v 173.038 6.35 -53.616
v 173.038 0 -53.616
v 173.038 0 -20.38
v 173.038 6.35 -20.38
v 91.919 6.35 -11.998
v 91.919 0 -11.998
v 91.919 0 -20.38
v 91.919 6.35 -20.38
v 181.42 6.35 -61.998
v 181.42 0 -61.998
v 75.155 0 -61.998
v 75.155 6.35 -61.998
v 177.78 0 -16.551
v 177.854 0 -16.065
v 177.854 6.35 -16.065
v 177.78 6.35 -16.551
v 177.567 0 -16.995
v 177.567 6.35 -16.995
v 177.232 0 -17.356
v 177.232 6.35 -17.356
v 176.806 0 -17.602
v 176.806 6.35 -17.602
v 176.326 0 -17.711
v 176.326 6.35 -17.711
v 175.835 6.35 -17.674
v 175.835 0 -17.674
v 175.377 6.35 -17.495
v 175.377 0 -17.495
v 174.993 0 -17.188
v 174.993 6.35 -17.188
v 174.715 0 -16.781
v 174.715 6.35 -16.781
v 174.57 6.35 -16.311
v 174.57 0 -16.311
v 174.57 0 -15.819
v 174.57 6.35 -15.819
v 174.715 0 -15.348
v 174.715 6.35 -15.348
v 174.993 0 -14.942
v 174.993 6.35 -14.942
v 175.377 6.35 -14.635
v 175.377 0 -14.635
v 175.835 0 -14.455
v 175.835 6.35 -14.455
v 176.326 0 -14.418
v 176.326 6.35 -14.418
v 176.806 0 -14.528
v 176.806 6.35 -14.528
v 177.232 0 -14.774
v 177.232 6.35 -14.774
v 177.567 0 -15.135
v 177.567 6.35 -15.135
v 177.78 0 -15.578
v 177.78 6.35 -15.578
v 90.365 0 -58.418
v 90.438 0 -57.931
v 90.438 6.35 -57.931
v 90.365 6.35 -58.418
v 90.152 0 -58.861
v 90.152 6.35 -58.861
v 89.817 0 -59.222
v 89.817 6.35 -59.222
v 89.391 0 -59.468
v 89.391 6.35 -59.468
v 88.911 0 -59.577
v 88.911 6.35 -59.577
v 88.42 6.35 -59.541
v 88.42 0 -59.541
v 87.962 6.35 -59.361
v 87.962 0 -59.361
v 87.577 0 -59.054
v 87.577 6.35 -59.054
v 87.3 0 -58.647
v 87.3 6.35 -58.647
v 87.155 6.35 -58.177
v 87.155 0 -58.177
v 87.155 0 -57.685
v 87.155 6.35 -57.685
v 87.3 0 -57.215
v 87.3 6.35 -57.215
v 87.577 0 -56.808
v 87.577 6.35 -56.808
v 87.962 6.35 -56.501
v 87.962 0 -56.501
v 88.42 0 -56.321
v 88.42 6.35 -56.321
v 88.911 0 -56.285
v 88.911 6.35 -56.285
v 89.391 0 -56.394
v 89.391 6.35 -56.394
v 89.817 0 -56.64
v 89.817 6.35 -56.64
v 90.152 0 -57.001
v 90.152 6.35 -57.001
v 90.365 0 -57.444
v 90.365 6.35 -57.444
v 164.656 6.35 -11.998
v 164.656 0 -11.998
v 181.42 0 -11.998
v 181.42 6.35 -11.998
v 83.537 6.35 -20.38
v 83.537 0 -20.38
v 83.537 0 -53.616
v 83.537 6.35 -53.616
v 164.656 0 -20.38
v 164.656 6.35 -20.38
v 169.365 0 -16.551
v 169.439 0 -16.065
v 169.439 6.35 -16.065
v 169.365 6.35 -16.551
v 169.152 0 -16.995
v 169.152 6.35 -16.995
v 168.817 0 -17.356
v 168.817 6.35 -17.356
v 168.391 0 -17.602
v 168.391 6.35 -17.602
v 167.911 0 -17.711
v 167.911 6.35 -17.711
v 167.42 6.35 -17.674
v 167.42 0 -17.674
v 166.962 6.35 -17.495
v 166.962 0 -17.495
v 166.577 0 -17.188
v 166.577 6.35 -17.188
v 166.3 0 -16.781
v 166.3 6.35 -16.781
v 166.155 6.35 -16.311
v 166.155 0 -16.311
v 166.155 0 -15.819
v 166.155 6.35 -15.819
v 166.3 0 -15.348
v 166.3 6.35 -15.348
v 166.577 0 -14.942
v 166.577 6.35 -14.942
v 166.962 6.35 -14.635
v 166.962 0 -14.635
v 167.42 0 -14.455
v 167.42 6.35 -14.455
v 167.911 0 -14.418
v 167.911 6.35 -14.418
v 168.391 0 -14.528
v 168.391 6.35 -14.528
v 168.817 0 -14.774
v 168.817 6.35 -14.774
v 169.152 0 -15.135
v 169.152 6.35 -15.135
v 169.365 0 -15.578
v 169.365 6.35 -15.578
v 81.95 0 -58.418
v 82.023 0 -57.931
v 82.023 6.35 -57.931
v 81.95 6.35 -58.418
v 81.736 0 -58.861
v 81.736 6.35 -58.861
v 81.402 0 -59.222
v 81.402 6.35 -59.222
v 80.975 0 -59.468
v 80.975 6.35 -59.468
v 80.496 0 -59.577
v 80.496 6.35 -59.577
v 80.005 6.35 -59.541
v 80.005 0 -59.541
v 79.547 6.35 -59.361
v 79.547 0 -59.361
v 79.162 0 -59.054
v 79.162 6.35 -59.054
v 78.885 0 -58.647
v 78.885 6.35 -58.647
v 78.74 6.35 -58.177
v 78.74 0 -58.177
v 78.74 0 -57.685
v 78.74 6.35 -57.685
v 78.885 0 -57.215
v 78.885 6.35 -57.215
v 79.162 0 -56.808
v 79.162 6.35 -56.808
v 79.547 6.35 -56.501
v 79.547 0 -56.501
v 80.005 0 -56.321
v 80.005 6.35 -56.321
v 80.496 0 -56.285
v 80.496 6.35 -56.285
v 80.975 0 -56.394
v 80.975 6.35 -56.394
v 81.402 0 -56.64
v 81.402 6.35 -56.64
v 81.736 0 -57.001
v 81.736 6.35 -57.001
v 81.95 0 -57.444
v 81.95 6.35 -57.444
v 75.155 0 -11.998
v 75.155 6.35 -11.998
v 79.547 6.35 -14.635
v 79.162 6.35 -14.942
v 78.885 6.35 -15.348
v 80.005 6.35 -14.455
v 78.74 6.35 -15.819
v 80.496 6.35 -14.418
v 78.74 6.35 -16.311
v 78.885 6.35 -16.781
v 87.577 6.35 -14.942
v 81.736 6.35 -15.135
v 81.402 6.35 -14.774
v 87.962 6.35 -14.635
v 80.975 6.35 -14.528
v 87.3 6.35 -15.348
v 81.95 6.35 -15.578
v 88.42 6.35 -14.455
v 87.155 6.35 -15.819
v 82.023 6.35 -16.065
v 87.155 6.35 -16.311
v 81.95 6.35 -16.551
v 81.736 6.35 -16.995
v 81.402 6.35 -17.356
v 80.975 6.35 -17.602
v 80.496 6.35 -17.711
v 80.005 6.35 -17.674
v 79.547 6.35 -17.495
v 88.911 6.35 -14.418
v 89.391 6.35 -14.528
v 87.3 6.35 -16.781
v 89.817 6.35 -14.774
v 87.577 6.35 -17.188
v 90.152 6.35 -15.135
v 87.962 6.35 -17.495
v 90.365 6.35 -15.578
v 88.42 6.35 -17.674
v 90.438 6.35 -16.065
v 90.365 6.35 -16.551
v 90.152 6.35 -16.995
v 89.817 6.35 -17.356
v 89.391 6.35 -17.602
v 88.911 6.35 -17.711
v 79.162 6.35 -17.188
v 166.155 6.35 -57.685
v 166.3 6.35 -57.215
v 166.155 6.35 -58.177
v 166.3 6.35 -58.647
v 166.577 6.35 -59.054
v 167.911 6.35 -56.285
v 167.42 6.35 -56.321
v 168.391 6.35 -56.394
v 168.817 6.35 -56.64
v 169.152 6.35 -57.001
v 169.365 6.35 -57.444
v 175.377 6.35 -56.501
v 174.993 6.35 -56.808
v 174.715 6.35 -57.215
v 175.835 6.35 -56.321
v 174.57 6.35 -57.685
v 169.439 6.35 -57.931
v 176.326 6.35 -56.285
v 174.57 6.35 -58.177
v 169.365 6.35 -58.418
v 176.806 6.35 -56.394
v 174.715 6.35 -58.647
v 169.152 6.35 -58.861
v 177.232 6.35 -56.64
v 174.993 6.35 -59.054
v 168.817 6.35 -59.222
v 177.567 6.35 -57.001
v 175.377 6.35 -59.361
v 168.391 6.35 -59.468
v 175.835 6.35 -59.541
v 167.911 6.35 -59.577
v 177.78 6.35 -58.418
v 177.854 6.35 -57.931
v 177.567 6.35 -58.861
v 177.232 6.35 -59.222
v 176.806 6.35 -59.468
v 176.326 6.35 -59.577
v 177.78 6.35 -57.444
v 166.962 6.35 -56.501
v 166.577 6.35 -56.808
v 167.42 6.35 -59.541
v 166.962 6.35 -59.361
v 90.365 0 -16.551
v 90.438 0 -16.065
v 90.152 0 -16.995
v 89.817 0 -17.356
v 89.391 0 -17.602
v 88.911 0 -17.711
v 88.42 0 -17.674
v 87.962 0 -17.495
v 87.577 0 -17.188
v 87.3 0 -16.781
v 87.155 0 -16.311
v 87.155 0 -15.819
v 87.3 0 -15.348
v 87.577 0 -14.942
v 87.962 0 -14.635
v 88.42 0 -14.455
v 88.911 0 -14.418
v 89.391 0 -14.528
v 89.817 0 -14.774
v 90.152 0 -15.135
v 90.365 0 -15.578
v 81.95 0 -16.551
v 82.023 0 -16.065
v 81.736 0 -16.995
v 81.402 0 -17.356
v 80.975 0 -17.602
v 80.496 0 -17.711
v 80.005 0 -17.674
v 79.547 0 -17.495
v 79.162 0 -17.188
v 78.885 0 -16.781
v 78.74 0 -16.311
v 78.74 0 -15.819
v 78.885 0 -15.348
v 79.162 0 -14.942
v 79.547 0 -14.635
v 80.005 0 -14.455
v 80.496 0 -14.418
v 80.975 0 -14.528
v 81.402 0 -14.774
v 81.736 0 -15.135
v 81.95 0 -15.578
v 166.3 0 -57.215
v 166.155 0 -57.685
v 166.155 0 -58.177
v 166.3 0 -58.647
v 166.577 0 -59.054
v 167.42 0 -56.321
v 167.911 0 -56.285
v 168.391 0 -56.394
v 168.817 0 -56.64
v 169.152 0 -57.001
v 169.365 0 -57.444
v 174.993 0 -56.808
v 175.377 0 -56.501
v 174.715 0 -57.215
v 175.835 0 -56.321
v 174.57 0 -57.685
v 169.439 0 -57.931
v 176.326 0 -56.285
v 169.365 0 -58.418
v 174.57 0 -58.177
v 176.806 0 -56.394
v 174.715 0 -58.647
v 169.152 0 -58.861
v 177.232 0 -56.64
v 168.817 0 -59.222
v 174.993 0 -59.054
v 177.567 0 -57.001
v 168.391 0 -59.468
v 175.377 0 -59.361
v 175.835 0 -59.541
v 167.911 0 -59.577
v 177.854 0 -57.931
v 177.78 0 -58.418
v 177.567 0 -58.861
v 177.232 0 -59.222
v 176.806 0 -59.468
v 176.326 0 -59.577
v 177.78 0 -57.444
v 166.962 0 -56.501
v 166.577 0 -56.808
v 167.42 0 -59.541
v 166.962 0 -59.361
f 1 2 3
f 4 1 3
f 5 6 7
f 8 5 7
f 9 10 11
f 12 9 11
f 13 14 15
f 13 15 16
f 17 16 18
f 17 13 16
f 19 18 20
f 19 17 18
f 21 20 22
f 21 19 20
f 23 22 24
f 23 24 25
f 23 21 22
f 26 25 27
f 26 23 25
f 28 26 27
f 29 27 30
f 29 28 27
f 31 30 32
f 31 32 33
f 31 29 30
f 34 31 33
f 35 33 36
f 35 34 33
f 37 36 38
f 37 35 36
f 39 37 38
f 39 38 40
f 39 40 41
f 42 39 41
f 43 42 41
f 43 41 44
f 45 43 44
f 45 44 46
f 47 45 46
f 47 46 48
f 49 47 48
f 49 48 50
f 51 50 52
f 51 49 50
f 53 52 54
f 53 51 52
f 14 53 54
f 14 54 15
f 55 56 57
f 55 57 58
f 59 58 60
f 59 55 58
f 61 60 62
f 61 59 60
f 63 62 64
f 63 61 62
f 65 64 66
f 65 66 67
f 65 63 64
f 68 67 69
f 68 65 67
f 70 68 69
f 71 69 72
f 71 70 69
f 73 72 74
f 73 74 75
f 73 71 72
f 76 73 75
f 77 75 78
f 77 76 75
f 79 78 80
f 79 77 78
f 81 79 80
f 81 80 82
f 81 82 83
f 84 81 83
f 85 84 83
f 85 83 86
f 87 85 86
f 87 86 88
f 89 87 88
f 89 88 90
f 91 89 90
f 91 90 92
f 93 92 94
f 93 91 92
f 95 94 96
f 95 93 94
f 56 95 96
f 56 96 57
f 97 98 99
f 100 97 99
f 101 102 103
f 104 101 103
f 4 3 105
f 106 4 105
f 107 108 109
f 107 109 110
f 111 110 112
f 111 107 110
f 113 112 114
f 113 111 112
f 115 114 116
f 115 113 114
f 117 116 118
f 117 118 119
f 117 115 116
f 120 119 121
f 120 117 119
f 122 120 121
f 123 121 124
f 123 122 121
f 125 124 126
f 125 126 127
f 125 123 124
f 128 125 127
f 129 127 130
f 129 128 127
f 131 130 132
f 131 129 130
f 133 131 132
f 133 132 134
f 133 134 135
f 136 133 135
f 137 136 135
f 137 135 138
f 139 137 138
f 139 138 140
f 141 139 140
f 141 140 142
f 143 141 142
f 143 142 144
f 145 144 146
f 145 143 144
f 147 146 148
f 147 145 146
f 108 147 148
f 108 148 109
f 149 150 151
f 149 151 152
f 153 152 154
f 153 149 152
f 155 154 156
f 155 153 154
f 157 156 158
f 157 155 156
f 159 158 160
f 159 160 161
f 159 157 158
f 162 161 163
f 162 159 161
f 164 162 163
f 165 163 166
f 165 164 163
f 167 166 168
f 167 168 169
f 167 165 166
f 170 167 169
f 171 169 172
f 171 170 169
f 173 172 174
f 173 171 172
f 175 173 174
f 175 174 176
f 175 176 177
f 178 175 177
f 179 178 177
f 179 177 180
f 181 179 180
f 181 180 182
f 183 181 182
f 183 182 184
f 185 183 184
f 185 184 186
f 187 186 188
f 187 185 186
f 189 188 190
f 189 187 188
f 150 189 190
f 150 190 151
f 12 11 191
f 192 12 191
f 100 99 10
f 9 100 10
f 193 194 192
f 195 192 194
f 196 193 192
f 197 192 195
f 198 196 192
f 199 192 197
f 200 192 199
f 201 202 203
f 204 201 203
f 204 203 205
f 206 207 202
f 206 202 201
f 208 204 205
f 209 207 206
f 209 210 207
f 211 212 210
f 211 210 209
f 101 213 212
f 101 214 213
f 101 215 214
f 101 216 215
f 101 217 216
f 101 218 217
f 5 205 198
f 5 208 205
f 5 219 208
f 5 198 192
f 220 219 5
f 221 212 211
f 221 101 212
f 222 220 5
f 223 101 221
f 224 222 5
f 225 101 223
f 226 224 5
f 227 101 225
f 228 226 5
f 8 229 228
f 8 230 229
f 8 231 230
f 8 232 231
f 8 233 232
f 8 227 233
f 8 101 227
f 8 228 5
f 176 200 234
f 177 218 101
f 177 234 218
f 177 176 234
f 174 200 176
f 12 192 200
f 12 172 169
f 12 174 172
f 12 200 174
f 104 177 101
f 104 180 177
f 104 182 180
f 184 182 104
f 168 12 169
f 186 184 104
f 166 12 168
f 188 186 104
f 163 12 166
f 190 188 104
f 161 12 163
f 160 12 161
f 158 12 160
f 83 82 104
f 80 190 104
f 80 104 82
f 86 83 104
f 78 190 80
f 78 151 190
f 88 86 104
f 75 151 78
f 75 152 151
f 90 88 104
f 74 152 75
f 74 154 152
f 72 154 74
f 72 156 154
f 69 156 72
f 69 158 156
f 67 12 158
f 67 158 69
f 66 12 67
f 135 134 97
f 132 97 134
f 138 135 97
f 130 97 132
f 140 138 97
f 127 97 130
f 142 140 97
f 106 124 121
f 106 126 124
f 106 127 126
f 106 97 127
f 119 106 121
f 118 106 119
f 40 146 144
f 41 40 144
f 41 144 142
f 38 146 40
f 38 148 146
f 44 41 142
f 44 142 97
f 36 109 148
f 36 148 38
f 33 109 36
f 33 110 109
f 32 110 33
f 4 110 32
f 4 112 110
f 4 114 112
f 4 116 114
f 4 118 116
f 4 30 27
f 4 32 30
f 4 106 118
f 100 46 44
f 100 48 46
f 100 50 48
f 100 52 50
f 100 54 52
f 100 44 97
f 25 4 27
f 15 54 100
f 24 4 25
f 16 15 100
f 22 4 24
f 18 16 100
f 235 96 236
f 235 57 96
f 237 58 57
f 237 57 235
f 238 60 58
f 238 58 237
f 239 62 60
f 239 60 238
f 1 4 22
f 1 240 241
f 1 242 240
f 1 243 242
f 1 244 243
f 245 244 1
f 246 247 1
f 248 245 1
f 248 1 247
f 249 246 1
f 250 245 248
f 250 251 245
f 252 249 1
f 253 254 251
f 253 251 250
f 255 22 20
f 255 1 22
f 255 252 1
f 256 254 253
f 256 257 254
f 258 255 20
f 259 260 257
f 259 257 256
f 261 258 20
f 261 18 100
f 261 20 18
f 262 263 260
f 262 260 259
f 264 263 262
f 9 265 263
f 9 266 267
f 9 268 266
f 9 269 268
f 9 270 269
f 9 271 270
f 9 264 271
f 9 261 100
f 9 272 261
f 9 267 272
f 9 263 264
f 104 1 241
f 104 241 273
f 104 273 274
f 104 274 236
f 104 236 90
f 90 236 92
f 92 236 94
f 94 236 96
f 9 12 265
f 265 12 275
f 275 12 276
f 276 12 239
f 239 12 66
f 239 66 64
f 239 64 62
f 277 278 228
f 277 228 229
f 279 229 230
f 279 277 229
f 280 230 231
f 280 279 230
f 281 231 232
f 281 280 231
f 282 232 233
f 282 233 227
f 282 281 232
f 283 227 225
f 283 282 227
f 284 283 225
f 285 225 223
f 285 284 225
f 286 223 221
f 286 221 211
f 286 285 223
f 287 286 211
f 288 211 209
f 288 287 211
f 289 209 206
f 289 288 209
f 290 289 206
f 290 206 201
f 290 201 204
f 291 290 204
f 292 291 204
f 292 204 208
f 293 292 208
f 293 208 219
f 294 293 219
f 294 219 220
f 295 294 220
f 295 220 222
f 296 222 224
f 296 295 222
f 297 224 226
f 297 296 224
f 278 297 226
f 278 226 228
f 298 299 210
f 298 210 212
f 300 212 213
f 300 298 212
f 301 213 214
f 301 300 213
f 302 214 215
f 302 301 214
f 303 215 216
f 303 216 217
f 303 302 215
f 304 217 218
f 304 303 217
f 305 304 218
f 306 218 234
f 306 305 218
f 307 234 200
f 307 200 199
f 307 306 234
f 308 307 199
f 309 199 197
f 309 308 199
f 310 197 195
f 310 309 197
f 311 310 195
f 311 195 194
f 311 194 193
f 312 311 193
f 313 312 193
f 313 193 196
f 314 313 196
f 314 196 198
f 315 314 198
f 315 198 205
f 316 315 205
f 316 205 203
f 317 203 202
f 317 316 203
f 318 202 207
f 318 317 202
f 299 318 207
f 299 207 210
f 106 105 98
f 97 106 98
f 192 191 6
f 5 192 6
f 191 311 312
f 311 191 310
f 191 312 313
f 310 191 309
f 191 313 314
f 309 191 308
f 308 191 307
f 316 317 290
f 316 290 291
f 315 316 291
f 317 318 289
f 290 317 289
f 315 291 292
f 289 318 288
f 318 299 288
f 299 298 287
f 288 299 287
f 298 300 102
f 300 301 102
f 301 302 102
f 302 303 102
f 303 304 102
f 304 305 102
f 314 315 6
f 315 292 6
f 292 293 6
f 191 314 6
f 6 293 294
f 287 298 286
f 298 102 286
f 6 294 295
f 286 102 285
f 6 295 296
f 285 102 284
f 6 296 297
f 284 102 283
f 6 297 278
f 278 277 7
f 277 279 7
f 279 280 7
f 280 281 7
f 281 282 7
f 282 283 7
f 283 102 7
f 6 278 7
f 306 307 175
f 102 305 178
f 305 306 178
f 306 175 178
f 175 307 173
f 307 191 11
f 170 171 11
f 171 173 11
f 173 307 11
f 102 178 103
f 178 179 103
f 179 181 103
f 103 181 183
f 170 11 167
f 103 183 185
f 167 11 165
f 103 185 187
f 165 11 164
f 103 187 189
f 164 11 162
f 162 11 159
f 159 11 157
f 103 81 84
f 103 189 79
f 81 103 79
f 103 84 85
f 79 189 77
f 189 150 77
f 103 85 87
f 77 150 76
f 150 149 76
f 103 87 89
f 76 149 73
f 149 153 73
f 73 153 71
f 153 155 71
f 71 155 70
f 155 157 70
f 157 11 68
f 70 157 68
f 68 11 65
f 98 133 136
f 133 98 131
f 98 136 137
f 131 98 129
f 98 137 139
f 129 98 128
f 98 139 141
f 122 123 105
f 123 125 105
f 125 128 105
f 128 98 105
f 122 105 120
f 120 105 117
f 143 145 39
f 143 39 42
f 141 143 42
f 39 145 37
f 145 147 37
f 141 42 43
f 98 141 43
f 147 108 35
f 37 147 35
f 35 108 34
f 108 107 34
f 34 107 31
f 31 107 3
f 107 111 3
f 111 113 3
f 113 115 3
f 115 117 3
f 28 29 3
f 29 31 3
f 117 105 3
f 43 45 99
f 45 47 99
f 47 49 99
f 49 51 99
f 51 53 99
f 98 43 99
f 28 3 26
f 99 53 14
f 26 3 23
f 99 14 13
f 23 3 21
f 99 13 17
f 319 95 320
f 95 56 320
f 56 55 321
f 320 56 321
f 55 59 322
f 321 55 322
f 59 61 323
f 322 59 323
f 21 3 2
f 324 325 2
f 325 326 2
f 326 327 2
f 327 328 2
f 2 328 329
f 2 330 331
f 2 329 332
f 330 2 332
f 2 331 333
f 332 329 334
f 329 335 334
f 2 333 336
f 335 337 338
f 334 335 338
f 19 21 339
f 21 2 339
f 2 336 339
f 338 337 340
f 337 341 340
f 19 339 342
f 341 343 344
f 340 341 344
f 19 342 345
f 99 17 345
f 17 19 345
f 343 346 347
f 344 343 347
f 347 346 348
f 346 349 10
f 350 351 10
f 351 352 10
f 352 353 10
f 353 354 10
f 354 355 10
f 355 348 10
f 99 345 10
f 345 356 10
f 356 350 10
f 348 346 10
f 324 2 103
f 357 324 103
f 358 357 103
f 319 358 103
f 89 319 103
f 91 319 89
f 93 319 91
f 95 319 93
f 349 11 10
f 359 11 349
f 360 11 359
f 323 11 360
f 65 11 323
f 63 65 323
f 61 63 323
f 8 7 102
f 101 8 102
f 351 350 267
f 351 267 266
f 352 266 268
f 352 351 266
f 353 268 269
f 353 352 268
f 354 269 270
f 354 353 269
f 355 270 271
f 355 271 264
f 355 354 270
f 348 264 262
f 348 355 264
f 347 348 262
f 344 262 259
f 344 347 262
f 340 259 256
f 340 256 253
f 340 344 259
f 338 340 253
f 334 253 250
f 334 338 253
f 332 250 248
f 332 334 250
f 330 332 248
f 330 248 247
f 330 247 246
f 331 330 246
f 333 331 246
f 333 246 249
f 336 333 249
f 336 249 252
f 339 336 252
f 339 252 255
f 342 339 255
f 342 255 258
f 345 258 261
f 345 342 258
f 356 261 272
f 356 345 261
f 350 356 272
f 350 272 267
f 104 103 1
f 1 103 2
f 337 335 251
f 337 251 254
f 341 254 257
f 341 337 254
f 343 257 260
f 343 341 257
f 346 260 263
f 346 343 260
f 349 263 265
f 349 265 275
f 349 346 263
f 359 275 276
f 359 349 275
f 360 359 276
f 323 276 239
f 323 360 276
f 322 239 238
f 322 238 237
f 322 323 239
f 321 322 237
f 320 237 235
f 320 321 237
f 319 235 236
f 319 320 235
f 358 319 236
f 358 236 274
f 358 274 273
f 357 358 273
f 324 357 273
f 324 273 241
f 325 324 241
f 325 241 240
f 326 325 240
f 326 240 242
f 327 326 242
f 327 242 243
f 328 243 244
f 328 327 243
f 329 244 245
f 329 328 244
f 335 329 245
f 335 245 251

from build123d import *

# Parameters (mm, degrees)
SKETCH1_R           = 1.651
BOSS_EXTRUDE1_DEPTH = 6.35


with BuildPart() as part:
    # Sketch1 → Boss-Extrude1 (new body)
    with BuildSketch(Plane(origin=(0, 0, 0), x_dir=(1, 0, 0), z_dir=(0, 1, 0))):
        Polygon((75.155177047, 61.997896552), (75.155177047, 11.997896552), (91.919177047, 11.997896552), (91.919177047, 20.379896552), (83.537177047, 20.379896552), (83.537177047, 53.615896552), (173.037829354, 53.615896552), (173.037829354, 20.379896552), (164.655829354, 20.379896552), (164.655829354, 11.997896552), (181.419829354, 11.997896552), (181.419829354, 61.997896552), align=None)
        with Locations((80.3721812, 16.064784874)):
            Circle(SKETCH1_R, mode=Mode.SUBTRACT)
        with Locations((80.3721812, 57.93100823)):
            Circle(SKETCH1_R, mode=Mode.SUBTRACT)
        with Locations((88.7874552, 16.064784874)):
            Circle(SKETCH1_R, mode=Mode.SUBTRACT)
        with Locations((167.7875512, 57.93100823)):
            Circle(SKETCH1_R, mode=Mode.SUBTRACT)
        with Locations((88.7874552, 57.93100823)):
            Circle(SKETCH1_R, mode=Mode.SUBTRACT)
        with Locations((176.2028252, 57.93100823)):
            Circle(SKETCH1_R, mode=Mode.SUBTRACT)
        with Locations((176.2028252, 16.064784874)):
            Circle(SKETCH1_R, mode=Mode.SUBTRACT)
        with Locations((167.7875512, 16.064784874)):
            Circle(SKETCH1_R, mode=Mode.SUBTRACT)
    extrude(amount=BOSS_EXTRUDE1_DEPTH)


solid = part.part
